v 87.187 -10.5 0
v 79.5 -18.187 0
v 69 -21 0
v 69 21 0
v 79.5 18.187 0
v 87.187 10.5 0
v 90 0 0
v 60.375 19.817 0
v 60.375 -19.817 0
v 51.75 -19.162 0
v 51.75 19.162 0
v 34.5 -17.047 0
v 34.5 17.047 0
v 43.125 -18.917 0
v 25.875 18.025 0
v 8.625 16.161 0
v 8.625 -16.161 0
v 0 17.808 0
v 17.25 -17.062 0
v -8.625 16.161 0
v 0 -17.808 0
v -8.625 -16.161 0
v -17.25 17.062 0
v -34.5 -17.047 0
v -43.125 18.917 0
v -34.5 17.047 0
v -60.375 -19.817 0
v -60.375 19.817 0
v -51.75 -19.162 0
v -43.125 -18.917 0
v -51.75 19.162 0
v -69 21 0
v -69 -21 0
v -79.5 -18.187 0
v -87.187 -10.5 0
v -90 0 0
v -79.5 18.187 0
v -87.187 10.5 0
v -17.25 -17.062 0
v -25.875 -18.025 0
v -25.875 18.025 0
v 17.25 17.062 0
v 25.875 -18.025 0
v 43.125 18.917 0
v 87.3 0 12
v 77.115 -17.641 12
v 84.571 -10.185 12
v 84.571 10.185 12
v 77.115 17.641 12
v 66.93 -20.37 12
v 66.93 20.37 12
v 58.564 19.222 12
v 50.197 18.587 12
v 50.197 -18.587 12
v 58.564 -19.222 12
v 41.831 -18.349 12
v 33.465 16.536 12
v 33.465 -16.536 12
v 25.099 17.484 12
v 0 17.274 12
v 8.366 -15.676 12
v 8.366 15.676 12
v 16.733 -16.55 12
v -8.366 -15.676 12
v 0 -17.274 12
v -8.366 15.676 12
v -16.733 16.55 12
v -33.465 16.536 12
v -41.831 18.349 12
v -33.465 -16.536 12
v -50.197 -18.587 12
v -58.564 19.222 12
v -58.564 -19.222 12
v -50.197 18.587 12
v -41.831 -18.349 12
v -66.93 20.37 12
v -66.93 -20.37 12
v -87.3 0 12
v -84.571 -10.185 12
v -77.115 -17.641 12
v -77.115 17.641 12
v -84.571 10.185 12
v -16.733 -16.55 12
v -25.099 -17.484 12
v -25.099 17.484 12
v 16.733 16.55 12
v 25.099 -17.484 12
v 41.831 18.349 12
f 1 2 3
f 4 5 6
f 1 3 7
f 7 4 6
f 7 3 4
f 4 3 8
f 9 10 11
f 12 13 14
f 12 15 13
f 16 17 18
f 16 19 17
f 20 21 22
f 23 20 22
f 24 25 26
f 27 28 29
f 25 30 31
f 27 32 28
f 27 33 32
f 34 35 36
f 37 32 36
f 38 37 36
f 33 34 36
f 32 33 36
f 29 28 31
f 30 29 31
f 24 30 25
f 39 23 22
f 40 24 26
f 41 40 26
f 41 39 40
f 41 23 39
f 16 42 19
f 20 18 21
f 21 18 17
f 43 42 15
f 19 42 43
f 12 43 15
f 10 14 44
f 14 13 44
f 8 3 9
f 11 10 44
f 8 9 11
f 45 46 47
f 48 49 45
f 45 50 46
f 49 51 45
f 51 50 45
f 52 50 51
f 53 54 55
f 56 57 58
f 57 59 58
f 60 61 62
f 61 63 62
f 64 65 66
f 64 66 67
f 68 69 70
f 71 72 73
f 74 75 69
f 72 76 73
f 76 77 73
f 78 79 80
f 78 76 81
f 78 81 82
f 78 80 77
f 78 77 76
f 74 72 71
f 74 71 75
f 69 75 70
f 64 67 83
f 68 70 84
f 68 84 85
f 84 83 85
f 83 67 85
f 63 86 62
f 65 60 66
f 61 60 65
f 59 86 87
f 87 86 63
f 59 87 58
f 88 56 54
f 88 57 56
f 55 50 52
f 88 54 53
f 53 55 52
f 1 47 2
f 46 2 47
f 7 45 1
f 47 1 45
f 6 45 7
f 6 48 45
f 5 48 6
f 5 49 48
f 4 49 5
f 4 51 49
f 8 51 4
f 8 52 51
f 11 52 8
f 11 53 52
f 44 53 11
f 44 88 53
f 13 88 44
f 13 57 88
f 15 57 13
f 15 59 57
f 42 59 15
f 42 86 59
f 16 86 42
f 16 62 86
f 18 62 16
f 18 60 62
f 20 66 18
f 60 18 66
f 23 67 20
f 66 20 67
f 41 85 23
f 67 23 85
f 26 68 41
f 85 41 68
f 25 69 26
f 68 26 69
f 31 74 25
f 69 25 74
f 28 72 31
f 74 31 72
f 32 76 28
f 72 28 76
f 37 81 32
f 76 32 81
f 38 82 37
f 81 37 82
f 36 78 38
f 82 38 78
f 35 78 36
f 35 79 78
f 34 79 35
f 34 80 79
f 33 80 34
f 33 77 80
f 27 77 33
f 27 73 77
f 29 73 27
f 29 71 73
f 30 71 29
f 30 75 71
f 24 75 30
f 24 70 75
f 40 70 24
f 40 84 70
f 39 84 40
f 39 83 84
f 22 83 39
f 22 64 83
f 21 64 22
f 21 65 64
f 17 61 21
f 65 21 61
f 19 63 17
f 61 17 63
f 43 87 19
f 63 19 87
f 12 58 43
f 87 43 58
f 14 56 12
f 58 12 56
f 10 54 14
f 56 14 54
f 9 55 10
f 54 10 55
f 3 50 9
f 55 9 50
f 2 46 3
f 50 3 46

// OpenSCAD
$fn = 32;

// ----------------------------------------------------------------------
// Handle: 180 x 42 mm grip, 12 mm thick
// ----------------------------------------------------------------------

// --- parameters (mm) ---
length = 180;             // grip length
width = 42;               // grip width
thickness = 12;           // grip thickness
waist = 0.8;              // width factor at the middle
draft = 0.97;             // top face scale of the extrusion
scallops = 6;             // finger rests per side
ripple = 0.06;            // depth factor of the finger rests

/* ergonomic grip outline, closed spline-like polygon in the XY plane */
grip = [[-69, 21], [-60.375, 19.817], [-51.75, 19.162], [-43.125, 18.917], [-34.5, 17.047], [-25.875, 18.025], [-17.25, 17.062], [-8.625, 16.161], [0, 17.808], [8.625, 16.161], [17.25, 17.062], [25.875, 18.025], [34.5, 17.047], [43.125, 18.917], [51.75, 19.162], [60.375, 19.817], [69, 21], [79.5, 18.187], [87.187, 10.5], [90, 0], [87.187, -10.5], [79.5, -18.187], [69, -21], [69, -21], [60.375, -19.817], [51.75, -19.162], [43.125, -18.917], [34.5, -17.047], [25.875, -18.025], [17.25, -17.062], [8.625, -16.161], [0, -17.808], [-8.625, -16.161], [-17.25, -17.062], [-25.875, -18.025], [-34.5, -17.047], [-43.125, -18.917], [-51.75, -19.162], [-60.375, -19.817], [-69, -21], [-79.5, -18.187], [-87.187, -10.5], [-90, 0], [-87.187, 10.5], [-79.5, 18.187], [-69, 21]];

module grip_body() {
  linear_extrude(height = thickness, scale = draft) polygon(grip);
}

difference() {
  union() {
    grip_body();
  }
}
